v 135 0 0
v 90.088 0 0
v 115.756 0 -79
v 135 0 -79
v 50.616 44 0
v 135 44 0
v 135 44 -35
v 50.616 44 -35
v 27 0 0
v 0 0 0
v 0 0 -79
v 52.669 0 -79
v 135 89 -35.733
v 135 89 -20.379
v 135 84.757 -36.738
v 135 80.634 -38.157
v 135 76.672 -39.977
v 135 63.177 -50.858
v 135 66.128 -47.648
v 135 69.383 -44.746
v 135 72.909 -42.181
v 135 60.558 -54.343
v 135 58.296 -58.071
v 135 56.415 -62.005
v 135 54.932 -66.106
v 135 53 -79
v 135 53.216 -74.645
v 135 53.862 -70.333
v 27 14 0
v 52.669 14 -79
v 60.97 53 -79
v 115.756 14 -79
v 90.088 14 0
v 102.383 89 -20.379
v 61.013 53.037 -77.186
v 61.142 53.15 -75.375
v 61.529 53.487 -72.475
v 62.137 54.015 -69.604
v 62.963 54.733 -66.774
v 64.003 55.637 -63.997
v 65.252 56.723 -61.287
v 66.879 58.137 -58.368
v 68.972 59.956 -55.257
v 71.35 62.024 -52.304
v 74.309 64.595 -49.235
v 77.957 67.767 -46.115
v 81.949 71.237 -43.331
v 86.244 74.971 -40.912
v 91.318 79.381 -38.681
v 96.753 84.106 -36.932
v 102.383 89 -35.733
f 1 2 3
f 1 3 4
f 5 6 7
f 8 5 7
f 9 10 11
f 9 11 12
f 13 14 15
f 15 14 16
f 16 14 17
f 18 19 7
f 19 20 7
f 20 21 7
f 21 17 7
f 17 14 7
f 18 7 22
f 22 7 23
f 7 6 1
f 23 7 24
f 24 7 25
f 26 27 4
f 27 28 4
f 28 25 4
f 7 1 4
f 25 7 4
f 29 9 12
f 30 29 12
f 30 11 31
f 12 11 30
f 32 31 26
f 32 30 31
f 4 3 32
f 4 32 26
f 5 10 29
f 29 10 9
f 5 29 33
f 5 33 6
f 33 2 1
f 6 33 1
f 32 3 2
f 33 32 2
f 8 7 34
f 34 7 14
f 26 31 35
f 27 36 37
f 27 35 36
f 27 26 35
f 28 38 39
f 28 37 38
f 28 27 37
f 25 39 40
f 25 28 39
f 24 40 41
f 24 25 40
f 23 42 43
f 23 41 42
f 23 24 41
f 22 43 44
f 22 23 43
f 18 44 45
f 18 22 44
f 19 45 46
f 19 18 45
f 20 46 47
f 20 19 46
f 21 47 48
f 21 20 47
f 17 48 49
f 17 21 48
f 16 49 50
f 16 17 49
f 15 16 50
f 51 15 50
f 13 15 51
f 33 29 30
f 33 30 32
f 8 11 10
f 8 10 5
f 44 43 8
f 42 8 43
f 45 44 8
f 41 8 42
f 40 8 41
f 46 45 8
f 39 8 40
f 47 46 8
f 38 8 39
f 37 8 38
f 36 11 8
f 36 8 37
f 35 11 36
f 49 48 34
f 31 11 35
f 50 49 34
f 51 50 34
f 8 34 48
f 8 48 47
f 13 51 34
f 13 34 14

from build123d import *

# Parameters (mm, degrees)
SKETCH2_W                 = 135
SKETCH2_H                 = 79
BASE_MATERIAL_DEPTH       = 89
THRU_ALL_CUTS_DEPTH       = 136
ANGLE_THRU_ALL_DEPTH      = 21.37861367
ANGLE_THRU_ALL_DEPTH_BACK = 59.62138633
CUT_EXTRUDE3_DEPTH        = 14


with BuildPart() as part:
    # Sketch2 → base-material (new body)
    with BuildSketch(Plane(origin=(0, 0, 0), x_dir=(1, 0, 0), z_dir=(0, 1, 0))):
        with Locations((67.5, 39.5)):
            Rectangle(SKETCH2_W, SKETCH2_H)
    extrude(amount=BASE_MATERIAL_DEPTH)

    # Sketch3 → thru-all-cuts (cut, through all)
    with BuildSketch(Plane(origin=(135, 0, 0), x_dir=(0, 0, -1), z_dir=(1, 0, 0))):
        with BuildLine():
            Line((35.733384694, 89), (79, 89))
            Line((79, 89), (79, 53))
            ThreePointArc((79, 53), (50.857505441, 63.176930949), (35.733384694, 89))
        make_face()
        Polygon((0, 44), (35, 44), (20.37861367, 89), (0, 89), align=None)
    extrude(amount=-THRU_ALL_CUTS_DEPTH, mode=Mode.SUBTRACT)

    # Sketch5 → angle-thru-all (cut, two sides)
    with BuildSketch(Plane.XY.offset(-20.37861367)) as angle_thru_all_sk:
        Polygon((0, 0), (102.382788243, 89), (0, 89), align=None)
    extrude(amount=ANGLE_THRU_ALL_DEPTH, mode=Mode.SUBTRACT)
    extrude(angle_thru_all_sk.sketch, amount=-ANGLE_THRU_ALL_DEPTH_BACK, mode=Mode.SUBTRACT)

    # Sketch7 → Cut-Extrude3 (cut)
    with BuildSketch(Plane.XZ):
        Polygon((27, 0), (52.668656002, -79), (115.756389457, -79), (90.087733454, 0), align=None)
    extrude(amount=-CUT_EXTRUDE3_DEPTH, mode=Mode.SUBTRACT)


solid = part.part
